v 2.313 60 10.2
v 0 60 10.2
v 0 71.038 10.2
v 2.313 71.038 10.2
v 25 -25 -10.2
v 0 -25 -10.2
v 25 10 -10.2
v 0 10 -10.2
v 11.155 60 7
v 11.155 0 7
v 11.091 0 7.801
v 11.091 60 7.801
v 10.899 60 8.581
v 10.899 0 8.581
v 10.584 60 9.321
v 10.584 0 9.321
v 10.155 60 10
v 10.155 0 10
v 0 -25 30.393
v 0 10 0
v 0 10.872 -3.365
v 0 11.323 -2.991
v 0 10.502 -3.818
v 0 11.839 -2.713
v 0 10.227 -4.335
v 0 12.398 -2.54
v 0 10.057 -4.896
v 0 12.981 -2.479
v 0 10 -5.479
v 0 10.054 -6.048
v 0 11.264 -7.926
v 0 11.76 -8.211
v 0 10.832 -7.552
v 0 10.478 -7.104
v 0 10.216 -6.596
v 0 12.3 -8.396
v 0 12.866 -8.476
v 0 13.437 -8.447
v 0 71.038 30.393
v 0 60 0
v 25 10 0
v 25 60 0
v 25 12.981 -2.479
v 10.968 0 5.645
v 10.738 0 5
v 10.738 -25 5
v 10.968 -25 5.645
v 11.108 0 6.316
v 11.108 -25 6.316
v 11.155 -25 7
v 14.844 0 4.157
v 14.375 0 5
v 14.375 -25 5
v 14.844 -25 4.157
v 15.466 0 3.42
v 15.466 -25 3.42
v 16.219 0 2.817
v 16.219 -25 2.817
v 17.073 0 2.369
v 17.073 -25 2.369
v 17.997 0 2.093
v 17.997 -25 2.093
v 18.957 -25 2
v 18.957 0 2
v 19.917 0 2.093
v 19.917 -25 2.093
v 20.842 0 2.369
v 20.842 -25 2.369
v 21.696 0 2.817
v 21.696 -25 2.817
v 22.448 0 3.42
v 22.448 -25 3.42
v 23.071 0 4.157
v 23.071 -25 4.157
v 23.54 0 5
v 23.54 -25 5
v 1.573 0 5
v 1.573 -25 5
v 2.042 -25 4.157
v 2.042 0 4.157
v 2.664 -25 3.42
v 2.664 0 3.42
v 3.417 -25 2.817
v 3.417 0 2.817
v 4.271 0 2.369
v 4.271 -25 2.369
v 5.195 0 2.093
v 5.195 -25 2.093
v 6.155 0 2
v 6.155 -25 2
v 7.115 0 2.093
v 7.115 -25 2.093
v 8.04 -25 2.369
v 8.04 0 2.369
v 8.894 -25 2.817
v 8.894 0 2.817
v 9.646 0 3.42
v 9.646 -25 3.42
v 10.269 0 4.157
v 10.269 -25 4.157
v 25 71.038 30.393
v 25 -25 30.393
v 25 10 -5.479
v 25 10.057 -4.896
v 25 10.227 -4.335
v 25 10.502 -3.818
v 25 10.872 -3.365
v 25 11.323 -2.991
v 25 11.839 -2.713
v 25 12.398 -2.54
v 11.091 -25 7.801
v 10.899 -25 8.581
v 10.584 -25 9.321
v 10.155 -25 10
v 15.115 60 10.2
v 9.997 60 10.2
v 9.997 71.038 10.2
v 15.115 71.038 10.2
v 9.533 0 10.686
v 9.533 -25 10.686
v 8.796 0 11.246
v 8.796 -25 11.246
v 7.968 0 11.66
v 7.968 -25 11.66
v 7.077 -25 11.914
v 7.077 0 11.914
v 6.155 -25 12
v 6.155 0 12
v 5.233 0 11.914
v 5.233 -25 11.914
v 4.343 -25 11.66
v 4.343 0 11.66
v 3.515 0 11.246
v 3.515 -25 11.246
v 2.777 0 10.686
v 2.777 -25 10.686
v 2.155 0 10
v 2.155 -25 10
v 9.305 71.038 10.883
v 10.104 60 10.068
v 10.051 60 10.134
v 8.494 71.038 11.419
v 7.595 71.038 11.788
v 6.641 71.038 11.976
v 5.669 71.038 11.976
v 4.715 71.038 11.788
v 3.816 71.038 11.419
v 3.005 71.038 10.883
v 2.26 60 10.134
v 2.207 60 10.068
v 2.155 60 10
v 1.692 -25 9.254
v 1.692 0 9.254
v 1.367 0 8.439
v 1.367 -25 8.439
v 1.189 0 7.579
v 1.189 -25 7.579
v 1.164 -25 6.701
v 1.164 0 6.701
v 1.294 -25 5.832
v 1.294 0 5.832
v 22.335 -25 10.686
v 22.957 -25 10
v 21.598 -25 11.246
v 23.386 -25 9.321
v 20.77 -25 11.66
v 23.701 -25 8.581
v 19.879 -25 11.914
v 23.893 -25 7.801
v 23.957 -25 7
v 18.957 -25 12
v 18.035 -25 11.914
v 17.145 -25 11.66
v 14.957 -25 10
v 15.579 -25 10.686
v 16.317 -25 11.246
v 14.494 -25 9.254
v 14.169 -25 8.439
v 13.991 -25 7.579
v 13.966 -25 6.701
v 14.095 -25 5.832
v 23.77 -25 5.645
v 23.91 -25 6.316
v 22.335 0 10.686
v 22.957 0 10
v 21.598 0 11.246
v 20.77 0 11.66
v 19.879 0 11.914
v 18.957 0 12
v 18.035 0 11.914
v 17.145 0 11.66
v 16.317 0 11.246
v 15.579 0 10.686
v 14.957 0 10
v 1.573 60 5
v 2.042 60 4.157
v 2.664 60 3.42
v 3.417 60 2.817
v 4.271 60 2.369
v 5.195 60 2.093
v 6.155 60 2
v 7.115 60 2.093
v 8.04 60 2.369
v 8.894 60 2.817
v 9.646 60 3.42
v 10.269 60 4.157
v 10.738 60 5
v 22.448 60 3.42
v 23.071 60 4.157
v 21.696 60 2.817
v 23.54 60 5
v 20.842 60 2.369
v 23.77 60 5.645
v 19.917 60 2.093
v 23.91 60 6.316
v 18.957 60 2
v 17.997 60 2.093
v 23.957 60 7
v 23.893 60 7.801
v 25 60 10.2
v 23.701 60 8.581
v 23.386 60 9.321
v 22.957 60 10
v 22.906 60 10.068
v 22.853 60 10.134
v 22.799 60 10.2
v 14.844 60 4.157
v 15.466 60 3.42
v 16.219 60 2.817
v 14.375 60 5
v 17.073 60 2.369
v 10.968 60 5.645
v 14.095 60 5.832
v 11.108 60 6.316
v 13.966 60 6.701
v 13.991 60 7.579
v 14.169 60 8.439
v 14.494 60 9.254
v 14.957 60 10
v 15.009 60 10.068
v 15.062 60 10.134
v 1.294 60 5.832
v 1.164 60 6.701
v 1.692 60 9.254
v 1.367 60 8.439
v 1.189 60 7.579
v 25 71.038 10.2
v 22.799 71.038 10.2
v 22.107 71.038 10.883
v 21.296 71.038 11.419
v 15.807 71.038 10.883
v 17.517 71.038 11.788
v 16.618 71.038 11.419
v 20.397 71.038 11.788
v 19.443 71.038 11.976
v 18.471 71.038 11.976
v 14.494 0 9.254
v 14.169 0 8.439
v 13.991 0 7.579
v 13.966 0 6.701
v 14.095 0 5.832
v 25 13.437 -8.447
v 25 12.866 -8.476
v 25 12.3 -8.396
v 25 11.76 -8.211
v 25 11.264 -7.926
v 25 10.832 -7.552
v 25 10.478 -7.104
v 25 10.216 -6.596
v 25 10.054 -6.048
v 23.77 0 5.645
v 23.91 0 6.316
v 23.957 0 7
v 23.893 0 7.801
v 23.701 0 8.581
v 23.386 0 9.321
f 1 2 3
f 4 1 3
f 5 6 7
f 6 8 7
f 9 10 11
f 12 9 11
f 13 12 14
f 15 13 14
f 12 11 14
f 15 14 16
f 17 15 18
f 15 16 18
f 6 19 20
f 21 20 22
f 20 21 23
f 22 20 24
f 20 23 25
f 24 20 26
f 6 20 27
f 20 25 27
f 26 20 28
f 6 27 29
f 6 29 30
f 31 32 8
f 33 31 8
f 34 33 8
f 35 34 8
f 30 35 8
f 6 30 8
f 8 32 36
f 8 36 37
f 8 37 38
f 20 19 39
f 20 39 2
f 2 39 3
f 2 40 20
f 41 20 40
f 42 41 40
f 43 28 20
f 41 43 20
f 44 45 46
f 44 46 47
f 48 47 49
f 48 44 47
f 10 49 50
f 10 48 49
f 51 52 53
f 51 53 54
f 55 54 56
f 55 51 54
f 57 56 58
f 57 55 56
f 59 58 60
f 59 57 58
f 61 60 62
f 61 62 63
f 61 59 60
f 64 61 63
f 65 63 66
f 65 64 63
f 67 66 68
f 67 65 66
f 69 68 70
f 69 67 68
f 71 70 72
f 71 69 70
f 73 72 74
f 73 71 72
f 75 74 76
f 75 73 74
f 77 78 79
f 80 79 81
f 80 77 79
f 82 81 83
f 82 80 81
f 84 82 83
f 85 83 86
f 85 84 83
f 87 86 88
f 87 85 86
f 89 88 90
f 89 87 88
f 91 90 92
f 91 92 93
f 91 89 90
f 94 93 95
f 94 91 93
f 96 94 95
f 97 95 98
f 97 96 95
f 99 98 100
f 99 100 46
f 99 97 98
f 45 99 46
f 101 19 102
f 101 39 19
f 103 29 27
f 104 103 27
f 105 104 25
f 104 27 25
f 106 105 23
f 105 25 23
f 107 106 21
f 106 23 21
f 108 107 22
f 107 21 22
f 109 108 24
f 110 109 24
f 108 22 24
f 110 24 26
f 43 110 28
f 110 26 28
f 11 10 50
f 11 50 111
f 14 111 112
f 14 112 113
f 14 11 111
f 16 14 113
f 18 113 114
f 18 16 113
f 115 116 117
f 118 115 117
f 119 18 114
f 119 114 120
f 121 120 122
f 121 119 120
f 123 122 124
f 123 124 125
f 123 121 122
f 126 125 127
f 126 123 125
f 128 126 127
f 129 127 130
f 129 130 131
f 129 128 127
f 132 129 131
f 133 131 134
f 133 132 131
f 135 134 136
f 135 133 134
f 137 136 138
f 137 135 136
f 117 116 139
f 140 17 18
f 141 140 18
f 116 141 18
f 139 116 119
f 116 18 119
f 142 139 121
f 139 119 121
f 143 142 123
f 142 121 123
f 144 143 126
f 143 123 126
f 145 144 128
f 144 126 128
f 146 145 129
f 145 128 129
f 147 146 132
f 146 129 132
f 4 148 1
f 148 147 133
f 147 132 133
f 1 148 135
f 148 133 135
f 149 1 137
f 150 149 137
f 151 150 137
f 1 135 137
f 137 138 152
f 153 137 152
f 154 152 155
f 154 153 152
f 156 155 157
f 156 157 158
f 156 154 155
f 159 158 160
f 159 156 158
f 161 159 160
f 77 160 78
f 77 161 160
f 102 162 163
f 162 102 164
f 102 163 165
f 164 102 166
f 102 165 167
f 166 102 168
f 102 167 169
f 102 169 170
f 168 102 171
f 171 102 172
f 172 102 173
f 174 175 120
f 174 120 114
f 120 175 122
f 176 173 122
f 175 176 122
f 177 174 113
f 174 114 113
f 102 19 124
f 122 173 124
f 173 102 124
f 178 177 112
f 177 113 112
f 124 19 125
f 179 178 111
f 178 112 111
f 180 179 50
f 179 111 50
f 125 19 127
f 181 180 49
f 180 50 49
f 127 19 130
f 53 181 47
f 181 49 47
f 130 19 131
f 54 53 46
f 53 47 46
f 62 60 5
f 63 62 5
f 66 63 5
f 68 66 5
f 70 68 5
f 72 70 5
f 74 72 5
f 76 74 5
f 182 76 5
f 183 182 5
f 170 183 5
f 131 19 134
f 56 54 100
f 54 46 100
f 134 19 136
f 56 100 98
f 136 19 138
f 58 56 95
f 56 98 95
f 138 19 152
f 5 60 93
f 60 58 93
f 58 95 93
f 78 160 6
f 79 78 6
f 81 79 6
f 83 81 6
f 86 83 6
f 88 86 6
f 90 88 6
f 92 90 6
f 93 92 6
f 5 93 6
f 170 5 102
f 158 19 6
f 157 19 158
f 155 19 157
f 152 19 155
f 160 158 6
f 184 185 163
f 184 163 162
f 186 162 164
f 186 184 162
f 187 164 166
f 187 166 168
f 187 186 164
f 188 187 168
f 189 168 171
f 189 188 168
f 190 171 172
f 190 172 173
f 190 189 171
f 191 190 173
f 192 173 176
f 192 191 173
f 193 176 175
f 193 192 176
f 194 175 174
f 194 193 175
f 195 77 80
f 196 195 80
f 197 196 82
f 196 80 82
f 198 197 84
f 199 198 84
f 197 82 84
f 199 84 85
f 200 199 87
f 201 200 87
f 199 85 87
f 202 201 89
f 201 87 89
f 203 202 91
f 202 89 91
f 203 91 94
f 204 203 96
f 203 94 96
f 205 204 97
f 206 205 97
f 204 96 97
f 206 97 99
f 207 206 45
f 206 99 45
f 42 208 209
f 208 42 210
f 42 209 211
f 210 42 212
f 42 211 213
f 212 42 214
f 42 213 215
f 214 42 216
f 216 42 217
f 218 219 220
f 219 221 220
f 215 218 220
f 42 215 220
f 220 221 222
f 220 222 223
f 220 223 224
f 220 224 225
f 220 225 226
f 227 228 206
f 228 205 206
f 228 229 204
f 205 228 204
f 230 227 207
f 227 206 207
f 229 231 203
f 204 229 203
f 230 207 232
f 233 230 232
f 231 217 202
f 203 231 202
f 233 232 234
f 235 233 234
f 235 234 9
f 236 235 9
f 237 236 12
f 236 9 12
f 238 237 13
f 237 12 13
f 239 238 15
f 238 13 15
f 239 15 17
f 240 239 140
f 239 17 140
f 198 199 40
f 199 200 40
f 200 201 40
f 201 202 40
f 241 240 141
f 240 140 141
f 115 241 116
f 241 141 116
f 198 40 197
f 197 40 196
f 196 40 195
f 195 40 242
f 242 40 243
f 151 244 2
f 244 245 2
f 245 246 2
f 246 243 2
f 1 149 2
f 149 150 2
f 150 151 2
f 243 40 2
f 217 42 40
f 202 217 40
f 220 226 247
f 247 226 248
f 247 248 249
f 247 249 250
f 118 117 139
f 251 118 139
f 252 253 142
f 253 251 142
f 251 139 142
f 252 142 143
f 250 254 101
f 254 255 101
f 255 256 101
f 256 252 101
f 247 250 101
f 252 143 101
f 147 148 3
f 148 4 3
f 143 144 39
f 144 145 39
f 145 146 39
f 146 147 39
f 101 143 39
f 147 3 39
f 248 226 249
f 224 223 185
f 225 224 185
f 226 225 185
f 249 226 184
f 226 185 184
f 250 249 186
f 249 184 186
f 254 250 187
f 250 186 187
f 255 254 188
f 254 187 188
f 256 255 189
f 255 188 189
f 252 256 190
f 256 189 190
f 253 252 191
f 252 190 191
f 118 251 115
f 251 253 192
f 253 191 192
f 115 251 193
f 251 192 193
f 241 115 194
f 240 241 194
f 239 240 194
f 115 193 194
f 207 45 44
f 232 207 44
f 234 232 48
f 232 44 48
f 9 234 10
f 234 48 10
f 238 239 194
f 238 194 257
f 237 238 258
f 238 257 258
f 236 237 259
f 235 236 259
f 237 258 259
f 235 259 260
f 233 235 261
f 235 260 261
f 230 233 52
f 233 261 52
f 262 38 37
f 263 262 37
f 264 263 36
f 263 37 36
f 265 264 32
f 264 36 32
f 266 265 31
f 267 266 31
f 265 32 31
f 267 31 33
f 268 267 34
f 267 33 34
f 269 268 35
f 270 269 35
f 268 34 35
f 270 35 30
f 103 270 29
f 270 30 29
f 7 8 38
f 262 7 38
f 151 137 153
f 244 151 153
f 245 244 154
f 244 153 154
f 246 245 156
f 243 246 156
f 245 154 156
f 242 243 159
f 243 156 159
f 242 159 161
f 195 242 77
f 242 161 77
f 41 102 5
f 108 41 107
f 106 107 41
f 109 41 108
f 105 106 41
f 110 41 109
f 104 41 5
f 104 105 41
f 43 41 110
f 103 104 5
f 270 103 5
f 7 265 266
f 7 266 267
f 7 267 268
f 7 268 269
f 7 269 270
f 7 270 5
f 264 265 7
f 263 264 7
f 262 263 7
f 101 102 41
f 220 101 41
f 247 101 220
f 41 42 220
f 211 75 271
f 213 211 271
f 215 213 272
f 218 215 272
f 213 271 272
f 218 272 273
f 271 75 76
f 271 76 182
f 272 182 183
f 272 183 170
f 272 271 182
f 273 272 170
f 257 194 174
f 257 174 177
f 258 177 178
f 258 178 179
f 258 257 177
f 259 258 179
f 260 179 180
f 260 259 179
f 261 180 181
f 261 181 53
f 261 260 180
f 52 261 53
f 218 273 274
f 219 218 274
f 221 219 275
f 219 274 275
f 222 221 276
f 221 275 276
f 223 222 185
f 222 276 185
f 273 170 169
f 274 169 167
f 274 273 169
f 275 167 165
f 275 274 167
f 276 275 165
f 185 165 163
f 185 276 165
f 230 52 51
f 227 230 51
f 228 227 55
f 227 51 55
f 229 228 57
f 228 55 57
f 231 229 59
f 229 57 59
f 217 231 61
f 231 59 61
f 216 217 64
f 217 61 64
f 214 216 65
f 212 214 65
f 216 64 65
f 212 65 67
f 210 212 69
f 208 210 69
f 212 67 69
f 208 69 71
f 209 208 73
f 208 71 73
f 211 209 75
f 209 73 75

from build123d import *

# Parameters (mm, degrees)
F1_DEPTH = 25
F3_DEPTH = 71.0393057594
F4_DEPTH = 25


with BuildPart() as f1:
    # F0 (on Right) → F1 (new body)
    with BuildSketch(Plane.YZ):
        Polygon((0, 10.2), (0, 0), (10, 0), (60, 0), (60, 10.2), align=None)
        Polygon((10, 0), (0, 0), (0, -10.2), (10, -10.2), (10, -5.4790303111), align=None)
        with BuildLine():
            Line((12.9808050988, -2.4790917191), (10, 0))
            Line((10, 0), (10, -5.4790303111))
            ThreePointArc((10, -5.4790303111), (10.8719040549, -3.3645072802), (12.9808050988, -2.4790917191))
        make_face()
        Polygon((0, 30.3931459785), (0, 10.2), (60, 10.2), (71.0383057594, 10.2), (71.0383057594, 30.3931459785), align=None)
        with BuildLine():
            ThreePointArc((13.4366949561, -8.4470763881), (11.0391436652, -7.7495021639), (10, -5.4790303111))
            Line((10, -5.4790303111), (10, -10.2))
            Line((10, -10.2), (13.4366949561, -8.4470763881))
        make_face()
    extrude(amount=F1_DEPTH)

    # F2 (on face) → F3 (cut, through all)
    with BuildSketch(Plane.XZ):
        with BuildLine():
            ThreePointArc((10.1552814897, 10), (6.1552813277, 12.0000002161), (2.1552811656, 10))
            Line((2.1552811656, 10), (10.1552814897, 10))
        make_face()
        with BuildLine():
            ThreePointArc((2.1552811656, 10), (1.1888790402, 7.5786610142), (1.572705727, 5))
            Line((1.572705727, 5), (10.7378569283, 5))
            ThreePointArc((10.7378569283, 5), (11.0498128682, 5.9784518822), (11.1552813277, 7.0000002161))
            ThreePointArc((11.1552813277, 7.0000002161), (10.8986978606, 8.581138918), (10.1552814897, 10))
            Line((10.1552814897, 10), (2.1552811656, 10))
        make_face()
        with BuildLine():
            Line((10.7378569283, 5), (1.572705727, 5))
            ThreePointArc((1.572705727, 5), (6.1552813277, 2.0000002161), (10.7378569283, 5))
        make_face()
        with BuildLine():
            Line((14.9572591335, 10), (22.9572591335, 10))
            ThreePointArc((22.9572591335, 10), (18.9572591335, 12), (14.9572591335, 10))
        make_face()
        with BuildLine():
            Line((14.3746834385, 5), (23.5398348284, 5))
            ThreePointArc((23.5398348284, 5), (23.8517906981, 5.9784517816), (23.9572591335, 7))
            ThreePointArc((23.9572591335, 7), (23.7006756237, 8.5811388301), (22.9572591335, 10))
            Line((22.9572591335, 10), (14.9572591335, 10))
            ThreePointArc((14.9572591335, 10), (13.9908568753, 7.5786610494), (14.3746834385, 5))
        make_face()
        with BuildLine():
            ThreePointArc((14.3746834385, 5), (18.9572591335, 2), (23.5398348284, 5))
            Line((23.5398348284, 5), (14.3746834385, 5))
        make_face()
    extrude(amount=-F3_DEPTH, mode=Mode.SUBTRACT)

    # F4 (add): a face of the model
    f4_faces = [f1.faces().sort_by_distance(p)[0] for p in [
        (12.4896952291, 0, 10.6636485804),
    ]]
    extrude(f4_faces, amount=F4_DEPTH)


solid = f1.part
